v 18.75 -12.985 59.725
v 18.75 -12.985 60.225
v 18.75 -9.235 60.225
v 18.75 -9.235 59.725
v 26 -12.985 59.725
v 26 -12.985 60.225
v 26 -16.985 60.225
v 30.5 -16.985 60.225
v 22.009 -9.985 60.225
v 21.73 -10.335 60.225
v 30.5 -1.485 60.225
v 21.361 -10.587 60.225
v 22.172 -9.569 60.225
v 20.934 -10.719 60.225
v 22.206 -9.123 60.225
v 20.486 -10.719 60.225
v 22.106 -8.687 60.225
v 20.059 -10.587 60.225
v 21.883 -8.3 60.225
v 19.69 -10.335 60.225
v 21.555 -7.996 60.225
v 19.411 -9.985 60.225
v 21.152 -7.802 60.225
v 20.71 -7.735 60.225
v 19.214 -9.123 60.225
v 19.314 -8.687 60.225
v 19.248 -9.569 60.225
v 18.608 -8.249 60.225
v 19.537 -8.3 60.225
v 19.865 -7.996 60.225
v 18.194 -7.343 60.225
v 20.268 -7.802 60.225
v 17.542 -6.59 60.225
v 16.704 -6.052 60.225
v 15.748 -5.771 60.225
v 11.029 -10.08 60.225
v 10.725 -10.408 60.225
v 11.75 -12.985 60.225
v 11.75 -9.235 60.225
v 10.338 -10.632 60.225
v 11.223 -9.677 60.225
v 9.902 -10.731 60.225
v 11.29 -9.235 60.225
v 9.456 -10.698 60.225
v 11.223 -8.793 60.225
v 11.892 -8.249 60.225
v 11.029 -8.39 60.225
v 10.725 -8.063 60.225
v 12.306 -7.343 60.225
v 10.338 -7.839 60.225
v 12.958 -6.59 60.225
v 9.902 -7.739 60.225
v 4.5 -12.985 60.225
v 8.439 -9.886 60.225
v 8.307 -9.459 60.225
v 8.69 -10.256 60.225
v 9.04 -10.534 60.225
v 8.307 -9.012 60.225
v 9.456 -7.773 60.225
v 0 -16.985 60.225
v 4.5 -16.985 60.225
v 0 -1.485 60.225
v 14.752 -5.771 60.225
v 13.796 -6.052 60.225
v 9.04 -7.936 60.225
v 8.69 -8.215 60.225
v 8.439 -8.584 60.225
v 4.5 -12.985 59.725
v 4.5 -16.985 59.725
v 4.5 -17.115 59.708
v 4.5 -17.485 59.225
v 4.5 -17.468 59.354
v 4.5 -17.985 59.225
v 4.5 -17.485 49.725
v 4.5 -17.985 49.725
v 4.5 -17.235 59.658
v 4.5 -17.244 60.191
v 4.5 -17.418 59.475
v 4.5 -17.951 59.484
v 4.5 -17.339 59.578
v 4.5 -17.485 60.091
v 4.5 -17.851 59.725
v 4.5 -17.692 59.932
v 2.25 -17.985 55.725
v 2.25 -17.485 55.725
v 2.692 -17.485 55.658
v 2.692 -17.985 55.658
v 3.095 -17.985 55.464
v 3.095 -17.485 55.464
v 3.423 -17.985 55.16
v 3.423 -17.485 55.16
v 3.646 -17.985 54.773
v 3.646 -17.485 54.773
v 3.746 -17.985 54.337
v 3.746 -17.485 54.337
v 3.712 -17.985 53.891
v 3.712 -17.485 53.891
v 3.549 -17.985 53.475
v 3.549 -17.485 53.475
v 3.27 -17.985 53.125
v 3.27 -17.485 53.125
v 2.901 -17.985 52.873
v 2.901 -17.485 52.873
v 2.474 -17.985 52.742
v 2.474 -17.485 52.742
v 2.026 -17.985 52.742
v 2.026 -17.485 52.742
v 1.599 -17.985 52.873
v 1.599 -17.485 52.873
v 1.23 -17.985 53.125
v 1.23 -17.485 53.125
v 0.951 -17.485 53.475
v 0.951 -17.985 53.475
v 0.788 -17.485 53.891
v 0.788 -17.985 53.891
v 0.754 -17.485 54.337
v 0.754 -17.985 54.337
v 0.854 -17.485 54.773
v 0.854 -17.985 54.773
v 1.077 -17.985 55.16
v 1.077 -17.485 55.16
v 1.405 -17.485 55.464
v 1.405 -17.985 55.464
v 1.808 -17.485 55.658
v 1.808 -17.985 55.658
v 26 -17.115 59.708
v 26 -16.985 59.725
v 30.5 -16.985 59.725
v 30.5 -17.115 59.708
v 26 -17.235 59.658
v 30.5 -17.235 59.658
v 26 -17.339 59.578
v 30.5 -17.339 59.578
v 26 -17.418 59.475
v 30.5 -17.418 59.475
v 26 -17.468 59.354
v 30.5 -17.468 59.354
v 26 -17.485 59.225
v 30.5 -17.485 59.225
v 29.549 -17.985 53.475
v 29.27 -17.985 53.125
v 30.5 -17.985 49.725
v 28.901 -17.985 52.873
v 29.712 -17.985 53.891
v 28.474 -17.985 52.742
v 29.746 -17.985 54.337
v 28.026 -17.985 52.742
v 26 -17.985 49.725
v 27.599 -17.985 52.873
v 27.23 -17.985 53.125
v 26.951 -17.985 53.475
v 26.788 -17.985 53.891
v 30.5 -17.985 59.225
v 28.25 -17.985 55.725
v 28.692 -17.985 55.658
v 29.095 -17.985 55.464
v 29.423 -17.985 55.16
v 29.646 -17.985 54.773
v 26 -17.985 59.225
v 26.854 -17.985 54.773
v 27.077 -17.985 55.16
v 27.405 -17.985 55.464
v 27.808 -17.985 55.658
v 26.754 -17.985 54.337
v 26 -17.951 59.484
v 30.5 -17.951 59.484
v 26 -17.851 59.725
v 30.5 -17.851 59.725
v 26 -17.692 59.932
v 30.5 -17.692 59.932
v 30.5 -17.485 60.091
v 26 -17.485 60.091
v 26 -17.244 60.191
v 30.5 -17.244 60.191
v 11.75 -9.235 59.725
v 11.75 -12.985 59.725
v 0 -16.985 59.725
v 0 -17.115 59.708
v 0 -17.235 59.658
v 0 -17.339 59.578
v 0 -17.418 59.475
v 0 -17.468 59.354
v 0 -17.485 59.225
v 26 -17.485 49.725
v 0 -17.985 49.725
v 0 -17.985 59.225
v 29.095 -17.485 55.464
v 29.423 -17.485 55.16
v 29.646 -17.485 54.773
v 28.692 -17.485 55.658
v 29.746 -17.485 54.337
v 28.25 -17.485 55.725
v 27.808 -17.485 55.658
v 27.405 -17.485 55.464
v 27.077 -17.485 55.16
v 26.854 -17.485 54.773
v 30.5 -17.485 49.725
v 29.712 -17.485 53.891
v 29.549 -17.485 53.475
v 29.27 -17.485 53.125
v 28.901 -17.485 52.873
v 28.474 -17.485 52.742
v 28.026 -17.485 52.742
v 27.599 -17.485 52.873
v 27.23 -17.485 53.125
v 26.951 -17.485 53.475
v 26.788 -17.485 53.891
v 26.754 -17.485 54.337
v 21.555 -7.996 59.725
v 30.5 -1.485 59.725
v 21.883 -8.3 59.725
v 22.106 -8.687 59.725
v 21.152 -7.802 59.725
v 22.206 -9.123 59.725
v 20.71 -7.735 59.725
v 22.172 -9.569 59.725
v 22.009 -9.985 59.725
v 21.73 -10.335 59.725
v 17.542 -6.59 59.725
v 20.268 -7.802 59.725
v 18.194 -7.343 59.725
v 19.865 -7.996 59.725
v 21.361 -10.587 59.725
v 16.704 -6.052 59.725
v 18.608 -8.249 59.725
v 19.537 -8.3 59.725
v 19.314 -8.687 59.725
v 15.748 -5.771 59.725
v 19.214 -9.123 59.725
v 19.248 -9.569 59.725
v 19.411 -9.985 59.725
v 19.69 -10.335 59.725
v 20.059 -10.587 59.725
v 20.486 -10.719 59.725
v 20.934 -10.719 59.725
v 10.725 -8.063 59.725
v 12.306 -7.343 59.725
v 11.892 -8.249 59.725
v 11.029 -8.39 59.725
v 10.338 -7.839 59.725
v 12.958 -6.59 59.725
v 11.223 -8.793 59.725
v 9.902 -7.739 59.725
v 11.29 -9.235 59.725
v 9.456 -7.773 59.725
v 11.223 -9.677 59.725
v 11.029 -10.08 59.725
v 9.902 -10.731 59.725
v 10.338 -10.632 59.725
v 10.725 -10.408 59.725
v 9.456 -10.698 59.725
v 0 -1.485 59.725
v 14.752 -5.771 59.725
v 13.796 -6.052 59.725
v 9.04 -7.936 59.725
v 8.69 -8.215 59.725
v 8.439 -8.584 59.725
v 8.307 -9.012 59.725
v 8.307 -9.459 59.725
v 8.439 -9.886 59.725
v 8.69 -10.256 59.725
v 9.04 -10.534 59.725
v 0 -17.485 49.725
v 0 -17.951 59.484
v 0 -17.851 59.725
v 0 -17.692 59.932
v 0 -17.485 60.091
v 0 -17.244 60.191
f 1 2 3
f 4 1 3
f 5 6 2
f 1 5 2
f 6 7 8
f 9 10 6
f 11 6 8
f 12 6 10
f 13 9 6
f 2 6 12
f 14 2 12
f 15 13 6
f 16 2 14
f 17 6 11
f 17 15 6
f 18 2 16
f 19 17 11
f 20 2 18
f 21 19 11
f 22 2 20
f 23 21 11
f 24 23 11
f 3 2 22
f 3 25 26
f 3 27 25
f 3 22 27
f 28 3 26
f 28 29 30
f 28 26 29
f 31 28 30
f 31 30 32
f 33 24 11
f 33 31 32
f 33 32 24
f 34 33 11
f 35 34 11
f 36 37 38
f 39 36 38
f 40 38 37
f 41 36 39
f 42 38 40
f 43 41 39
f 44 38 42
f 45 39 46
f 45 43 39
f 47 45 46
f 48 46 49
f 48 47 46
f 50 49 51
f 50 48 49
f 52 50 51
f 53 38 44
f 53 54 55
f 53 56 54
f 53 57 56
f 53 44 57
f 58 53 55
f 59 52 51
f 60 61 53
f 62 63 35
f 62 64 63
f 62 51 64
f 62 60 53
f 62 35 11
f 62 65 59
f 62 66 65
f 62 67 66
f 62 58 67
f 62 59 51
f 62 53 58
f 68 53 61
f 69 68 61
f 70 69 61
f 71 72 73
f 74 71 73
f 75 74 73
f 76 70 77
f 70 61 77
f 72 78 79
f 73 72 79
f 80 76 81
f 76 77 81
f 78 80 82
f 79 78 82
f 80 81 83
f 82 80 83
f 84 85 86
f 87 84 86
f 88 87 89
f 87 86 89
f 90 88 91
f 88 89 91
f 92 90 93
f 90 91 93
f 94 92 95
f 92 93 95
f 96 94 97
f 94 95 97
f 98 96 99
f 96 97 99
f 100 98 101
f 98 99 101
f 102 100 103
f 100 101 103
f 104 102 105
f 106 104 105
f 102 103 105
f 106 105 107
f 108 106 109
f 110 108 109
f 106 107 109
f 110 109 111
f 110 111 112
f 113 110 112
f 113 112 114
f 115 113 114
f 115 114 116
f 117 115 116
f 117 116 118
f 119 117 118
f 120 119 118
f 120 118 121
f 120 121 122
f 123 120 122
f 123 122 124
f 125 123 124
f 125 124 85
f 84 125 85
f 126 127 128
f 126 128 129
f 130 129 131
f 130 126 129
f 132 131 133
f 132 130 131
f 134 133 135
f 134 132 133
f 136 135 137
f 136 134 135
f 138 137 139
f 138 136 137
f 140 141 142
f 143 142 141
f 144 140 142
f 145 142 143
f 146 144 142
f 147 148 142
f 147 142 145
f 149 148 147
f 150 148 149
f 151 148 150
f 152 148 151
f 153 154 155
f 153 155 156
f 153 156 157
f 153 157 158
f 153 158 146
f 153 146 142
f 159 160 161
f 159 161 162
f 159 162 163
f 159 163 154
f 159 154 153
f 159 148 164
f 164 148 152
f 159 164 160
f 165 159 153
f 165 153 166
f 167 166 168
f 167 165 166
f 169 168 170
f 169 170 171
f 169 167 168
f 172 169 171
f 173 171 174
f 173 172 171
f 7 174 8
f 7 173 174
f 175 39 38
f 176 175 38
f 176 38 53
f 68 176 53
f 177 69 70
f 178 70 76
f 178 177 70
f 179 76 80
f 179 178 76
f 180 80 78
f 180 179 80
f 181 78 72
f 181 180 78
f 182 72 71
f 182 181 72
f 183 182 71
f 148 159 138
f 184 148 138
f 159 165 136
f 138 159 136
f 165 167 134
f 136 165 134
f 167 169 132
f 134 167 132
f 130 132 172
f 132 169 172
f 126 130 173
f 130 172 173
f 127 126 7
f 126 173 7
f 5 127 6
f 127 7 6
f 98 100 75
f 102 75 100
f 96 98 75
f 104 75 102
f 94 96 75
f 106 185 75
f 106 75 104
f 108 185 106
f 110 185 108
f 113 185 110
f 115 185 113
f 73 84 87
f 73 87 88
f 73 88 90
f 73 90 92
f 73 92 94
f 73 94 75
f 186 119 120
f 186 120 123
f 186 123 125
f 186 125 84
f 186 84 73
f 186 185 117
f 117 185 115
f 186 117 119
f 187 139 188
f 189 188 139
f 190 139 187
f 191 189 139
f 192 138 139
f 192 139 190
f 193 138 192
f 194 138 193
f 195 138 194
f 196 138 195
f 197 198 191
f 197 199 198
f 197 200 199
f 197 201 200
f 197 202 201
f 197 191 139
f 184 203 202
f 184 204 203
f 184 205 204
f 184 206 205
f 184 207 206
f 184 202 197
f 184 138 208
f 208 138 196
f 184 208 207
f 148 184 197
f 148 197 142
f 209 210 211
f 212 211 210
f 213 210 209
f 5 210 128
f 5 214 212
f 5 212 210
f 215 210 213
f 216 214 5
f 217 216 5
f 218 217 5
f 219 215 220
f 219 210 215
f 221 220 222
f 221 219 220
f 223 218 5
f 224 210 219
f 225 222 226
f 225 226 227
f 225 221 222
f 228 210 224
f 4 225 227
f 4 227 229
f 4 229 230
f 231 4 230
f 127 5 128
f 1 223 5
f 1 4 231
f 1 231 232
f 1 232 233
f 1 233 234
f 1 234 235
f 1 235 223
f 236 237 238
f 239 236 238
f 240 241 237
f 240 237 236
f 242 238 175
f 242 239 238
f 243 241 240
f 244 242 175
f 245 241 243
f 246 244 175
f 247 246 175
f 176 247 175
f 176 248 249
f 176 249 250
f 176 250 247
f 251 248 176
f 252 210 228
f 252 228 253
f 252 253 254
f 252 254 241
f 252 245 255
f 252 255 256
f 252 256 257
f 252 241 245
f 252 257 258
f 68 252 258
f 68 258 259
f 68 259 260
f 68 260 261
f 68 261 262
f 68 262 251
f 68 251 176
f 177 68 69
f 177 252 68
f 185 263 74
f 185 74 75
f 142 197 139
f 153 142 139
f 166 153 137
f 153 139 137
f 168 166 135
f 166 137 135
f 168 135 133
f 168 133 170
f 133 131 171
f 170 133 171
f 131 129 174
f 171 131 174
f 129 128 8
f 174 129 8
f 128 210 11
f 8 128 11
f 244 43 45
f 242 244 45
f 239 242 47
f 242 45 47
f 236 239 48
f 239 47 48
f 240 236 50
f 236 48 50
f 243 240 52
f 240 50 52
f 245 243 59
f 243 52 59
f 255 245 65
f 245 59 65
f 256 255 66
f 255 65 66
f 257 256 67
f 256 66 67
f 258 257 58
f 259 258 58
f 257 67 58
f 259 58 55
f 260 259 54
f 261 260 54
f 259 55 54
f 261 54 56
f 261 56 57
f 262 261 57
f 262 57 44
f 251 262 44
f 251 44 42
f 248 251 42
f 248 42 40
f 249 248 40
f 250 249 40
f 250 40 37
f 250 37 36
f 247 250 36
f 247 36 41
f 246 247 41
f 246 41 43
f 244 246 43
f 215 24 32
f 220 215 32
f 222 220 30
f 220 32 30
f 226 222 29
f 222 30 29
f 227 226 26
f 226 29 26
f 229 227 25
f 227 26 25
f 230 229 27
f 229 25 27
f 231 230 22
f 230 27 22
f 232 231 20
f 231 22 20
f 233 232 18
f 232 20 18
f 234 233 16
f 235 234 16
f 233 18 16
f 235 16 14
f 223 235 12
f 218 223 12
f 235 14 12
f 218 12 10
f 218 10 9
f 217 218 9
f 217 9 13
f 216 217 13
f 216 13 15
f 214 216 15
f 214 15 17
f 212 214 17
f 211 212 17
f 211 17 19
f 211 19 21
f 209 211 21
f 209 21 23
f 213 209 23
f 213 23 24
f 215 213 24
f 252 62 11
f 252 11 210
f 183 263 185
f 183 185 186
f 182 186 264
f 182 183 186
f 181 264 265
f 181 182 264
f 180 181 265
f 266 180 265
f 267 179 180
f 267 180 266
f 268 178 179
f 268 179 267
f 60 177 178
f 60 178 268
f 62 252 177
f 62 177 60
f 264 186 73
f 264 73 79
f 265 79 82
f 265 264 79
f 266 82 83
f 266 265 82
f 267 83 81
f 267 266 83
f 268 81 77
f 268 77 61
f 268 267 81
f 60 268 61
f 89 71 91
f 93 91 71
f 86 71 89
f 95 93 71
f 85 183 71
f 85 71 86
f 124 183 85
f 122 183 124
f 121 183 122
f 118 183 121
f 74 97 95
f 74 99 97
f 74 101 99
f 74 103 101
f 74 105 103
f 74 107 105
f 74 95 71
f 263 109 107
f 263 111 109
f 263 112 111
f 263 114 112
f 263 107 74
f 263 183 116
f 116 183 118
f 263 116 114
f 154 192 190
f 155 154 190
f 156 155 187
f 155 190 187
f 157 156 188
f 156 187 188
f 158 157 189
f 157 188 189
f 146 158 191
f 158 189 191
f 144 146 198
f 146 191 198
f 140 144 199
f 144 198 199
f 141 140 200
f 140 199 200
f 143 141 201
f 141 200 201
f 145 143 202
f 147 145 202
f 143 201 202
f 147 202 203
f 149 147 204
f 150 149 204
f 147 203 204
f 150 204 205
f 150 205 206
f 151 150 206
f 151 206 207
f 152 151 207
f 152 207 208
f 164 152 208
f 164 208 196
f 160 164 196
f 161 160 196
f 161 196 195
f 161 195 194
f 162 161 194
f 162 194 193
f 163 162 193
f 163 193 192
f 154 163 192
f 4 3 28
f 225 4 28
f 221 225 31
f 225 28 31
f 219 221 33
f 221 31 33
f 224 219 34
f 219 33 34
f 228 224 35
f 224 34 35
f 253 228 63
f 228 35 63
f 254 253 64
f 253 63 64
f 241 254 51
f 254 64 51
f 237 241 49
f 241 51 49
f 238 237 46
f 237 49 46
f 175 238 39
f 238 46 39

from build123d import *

# Parameters (mm, degrees)
BRIDA_BASE1_DEPTH     = 30.5
CROQUIS12_R           = 1.5
CORTAR_EXTRUIR1_DEPTH = 12
CROQUIS13_R           = 1.5
CORTAR_EXTRUIR2_DEPTH = 12


# Sheet-metal steps are written as plain solids
with BuildPart() as part:
    # Croquis1 → Brida base1 (new body)
    with BuildSketch(Plane(origin=(0, 0, 0), x_dir=(0, 0, -1), z_dir=(1, 0, 0))):
        with BuildLine():
            Line((-59.724940778, -1.485262267), (-59.724940778, -16.985262267))
            ThreePointArc((-59.724940778, -16.985262267), (-59.578494169, -17.338815658), (-59.224940778, -17.485262267))
            Line((-59.224940778, -17.485262267), (-49.724940778, -17.485262267))
            Line((-49.724940778, -17.485262267), (-49.724940778, -17.985262267))
            Line((-49.724940778, -17.985262267), (-59.224940778, -17.985262267))
            ThreePointArc((-59.224940778, -17.985262267), (-59.93204756, -17.692369049), (-60.224940778, -16.985262267))
            Line((-60.224940778, -16.985262267), (-60.224940778, -1.485262267))
            Line((-60.224940778, -1.485262267), (-59.724940778, -1.485262267))
        make_face()
    extrude(amount=BRIDA_BASE1_DEPTH)

    # Croquis12 → Cortar-Extruir1 (cut)
    with BuildSketch(Plane.XY.offset(60.224940778)):
        with Locations((9.79, -9.235262267)):
            Circle(CROQUIS12_R)
        with Locations(Location((20.71, -9.235262267, 0), (0, 0, 90))):
            Circle(CROQUIS12_R)
        with BuildLine():
            Line((11.75, -9.235262267), (11.75, -12.985262267))
            Line((11.75, -12.985262267), (4.5, -12.985262267))
            Line((4.5, -12.985262267), (4.5, -17.985262267))
            Line((4.5, -17.985262267), (11.75, -17.985262267))
            Line((11.75, -17.985262267), (18.75, -17.985262267))
            Line((18.75, -17.985262267), (26, -17.985262267))
            Line((26, -17.985262267), (26, -12.985262267))
            Line((26, -12.985262267), (18.75, -12.985262267))
            Line((18.75, -12.985262267), (18.75, -9.235262267))
            ThreePointArc((18.75, -9.235262267), (15.25, -5.735262267), (11.75, -9.235262267))
        make_face()
    extrude(amount=-CORTAR_EXTRUIR1_DEPTH, mode=Mode.SUBTRACT)

    # Croquis13 → Cortar-Extruir2 (cut)
    with BuildSketch(Plane(origin=(0, -17.485262267, 0), x_dir=(-1, 0, 0), z_dir=(0, 1, 0))):
        with Locations(Location((-28.25, 54.224940778, 0), (0, 0, 90))):
            Circle(CROQUIS13_R)
        with Locations(Location((-2.25, 54.224940778, 0), (0, 0, 90))):
            Circle(CROQUIS13_R)
    extrude(amount=-CORTAR_EXTRUIR2_DEPTH, mode=Mode.SUBTRACT)


solid = part.part
